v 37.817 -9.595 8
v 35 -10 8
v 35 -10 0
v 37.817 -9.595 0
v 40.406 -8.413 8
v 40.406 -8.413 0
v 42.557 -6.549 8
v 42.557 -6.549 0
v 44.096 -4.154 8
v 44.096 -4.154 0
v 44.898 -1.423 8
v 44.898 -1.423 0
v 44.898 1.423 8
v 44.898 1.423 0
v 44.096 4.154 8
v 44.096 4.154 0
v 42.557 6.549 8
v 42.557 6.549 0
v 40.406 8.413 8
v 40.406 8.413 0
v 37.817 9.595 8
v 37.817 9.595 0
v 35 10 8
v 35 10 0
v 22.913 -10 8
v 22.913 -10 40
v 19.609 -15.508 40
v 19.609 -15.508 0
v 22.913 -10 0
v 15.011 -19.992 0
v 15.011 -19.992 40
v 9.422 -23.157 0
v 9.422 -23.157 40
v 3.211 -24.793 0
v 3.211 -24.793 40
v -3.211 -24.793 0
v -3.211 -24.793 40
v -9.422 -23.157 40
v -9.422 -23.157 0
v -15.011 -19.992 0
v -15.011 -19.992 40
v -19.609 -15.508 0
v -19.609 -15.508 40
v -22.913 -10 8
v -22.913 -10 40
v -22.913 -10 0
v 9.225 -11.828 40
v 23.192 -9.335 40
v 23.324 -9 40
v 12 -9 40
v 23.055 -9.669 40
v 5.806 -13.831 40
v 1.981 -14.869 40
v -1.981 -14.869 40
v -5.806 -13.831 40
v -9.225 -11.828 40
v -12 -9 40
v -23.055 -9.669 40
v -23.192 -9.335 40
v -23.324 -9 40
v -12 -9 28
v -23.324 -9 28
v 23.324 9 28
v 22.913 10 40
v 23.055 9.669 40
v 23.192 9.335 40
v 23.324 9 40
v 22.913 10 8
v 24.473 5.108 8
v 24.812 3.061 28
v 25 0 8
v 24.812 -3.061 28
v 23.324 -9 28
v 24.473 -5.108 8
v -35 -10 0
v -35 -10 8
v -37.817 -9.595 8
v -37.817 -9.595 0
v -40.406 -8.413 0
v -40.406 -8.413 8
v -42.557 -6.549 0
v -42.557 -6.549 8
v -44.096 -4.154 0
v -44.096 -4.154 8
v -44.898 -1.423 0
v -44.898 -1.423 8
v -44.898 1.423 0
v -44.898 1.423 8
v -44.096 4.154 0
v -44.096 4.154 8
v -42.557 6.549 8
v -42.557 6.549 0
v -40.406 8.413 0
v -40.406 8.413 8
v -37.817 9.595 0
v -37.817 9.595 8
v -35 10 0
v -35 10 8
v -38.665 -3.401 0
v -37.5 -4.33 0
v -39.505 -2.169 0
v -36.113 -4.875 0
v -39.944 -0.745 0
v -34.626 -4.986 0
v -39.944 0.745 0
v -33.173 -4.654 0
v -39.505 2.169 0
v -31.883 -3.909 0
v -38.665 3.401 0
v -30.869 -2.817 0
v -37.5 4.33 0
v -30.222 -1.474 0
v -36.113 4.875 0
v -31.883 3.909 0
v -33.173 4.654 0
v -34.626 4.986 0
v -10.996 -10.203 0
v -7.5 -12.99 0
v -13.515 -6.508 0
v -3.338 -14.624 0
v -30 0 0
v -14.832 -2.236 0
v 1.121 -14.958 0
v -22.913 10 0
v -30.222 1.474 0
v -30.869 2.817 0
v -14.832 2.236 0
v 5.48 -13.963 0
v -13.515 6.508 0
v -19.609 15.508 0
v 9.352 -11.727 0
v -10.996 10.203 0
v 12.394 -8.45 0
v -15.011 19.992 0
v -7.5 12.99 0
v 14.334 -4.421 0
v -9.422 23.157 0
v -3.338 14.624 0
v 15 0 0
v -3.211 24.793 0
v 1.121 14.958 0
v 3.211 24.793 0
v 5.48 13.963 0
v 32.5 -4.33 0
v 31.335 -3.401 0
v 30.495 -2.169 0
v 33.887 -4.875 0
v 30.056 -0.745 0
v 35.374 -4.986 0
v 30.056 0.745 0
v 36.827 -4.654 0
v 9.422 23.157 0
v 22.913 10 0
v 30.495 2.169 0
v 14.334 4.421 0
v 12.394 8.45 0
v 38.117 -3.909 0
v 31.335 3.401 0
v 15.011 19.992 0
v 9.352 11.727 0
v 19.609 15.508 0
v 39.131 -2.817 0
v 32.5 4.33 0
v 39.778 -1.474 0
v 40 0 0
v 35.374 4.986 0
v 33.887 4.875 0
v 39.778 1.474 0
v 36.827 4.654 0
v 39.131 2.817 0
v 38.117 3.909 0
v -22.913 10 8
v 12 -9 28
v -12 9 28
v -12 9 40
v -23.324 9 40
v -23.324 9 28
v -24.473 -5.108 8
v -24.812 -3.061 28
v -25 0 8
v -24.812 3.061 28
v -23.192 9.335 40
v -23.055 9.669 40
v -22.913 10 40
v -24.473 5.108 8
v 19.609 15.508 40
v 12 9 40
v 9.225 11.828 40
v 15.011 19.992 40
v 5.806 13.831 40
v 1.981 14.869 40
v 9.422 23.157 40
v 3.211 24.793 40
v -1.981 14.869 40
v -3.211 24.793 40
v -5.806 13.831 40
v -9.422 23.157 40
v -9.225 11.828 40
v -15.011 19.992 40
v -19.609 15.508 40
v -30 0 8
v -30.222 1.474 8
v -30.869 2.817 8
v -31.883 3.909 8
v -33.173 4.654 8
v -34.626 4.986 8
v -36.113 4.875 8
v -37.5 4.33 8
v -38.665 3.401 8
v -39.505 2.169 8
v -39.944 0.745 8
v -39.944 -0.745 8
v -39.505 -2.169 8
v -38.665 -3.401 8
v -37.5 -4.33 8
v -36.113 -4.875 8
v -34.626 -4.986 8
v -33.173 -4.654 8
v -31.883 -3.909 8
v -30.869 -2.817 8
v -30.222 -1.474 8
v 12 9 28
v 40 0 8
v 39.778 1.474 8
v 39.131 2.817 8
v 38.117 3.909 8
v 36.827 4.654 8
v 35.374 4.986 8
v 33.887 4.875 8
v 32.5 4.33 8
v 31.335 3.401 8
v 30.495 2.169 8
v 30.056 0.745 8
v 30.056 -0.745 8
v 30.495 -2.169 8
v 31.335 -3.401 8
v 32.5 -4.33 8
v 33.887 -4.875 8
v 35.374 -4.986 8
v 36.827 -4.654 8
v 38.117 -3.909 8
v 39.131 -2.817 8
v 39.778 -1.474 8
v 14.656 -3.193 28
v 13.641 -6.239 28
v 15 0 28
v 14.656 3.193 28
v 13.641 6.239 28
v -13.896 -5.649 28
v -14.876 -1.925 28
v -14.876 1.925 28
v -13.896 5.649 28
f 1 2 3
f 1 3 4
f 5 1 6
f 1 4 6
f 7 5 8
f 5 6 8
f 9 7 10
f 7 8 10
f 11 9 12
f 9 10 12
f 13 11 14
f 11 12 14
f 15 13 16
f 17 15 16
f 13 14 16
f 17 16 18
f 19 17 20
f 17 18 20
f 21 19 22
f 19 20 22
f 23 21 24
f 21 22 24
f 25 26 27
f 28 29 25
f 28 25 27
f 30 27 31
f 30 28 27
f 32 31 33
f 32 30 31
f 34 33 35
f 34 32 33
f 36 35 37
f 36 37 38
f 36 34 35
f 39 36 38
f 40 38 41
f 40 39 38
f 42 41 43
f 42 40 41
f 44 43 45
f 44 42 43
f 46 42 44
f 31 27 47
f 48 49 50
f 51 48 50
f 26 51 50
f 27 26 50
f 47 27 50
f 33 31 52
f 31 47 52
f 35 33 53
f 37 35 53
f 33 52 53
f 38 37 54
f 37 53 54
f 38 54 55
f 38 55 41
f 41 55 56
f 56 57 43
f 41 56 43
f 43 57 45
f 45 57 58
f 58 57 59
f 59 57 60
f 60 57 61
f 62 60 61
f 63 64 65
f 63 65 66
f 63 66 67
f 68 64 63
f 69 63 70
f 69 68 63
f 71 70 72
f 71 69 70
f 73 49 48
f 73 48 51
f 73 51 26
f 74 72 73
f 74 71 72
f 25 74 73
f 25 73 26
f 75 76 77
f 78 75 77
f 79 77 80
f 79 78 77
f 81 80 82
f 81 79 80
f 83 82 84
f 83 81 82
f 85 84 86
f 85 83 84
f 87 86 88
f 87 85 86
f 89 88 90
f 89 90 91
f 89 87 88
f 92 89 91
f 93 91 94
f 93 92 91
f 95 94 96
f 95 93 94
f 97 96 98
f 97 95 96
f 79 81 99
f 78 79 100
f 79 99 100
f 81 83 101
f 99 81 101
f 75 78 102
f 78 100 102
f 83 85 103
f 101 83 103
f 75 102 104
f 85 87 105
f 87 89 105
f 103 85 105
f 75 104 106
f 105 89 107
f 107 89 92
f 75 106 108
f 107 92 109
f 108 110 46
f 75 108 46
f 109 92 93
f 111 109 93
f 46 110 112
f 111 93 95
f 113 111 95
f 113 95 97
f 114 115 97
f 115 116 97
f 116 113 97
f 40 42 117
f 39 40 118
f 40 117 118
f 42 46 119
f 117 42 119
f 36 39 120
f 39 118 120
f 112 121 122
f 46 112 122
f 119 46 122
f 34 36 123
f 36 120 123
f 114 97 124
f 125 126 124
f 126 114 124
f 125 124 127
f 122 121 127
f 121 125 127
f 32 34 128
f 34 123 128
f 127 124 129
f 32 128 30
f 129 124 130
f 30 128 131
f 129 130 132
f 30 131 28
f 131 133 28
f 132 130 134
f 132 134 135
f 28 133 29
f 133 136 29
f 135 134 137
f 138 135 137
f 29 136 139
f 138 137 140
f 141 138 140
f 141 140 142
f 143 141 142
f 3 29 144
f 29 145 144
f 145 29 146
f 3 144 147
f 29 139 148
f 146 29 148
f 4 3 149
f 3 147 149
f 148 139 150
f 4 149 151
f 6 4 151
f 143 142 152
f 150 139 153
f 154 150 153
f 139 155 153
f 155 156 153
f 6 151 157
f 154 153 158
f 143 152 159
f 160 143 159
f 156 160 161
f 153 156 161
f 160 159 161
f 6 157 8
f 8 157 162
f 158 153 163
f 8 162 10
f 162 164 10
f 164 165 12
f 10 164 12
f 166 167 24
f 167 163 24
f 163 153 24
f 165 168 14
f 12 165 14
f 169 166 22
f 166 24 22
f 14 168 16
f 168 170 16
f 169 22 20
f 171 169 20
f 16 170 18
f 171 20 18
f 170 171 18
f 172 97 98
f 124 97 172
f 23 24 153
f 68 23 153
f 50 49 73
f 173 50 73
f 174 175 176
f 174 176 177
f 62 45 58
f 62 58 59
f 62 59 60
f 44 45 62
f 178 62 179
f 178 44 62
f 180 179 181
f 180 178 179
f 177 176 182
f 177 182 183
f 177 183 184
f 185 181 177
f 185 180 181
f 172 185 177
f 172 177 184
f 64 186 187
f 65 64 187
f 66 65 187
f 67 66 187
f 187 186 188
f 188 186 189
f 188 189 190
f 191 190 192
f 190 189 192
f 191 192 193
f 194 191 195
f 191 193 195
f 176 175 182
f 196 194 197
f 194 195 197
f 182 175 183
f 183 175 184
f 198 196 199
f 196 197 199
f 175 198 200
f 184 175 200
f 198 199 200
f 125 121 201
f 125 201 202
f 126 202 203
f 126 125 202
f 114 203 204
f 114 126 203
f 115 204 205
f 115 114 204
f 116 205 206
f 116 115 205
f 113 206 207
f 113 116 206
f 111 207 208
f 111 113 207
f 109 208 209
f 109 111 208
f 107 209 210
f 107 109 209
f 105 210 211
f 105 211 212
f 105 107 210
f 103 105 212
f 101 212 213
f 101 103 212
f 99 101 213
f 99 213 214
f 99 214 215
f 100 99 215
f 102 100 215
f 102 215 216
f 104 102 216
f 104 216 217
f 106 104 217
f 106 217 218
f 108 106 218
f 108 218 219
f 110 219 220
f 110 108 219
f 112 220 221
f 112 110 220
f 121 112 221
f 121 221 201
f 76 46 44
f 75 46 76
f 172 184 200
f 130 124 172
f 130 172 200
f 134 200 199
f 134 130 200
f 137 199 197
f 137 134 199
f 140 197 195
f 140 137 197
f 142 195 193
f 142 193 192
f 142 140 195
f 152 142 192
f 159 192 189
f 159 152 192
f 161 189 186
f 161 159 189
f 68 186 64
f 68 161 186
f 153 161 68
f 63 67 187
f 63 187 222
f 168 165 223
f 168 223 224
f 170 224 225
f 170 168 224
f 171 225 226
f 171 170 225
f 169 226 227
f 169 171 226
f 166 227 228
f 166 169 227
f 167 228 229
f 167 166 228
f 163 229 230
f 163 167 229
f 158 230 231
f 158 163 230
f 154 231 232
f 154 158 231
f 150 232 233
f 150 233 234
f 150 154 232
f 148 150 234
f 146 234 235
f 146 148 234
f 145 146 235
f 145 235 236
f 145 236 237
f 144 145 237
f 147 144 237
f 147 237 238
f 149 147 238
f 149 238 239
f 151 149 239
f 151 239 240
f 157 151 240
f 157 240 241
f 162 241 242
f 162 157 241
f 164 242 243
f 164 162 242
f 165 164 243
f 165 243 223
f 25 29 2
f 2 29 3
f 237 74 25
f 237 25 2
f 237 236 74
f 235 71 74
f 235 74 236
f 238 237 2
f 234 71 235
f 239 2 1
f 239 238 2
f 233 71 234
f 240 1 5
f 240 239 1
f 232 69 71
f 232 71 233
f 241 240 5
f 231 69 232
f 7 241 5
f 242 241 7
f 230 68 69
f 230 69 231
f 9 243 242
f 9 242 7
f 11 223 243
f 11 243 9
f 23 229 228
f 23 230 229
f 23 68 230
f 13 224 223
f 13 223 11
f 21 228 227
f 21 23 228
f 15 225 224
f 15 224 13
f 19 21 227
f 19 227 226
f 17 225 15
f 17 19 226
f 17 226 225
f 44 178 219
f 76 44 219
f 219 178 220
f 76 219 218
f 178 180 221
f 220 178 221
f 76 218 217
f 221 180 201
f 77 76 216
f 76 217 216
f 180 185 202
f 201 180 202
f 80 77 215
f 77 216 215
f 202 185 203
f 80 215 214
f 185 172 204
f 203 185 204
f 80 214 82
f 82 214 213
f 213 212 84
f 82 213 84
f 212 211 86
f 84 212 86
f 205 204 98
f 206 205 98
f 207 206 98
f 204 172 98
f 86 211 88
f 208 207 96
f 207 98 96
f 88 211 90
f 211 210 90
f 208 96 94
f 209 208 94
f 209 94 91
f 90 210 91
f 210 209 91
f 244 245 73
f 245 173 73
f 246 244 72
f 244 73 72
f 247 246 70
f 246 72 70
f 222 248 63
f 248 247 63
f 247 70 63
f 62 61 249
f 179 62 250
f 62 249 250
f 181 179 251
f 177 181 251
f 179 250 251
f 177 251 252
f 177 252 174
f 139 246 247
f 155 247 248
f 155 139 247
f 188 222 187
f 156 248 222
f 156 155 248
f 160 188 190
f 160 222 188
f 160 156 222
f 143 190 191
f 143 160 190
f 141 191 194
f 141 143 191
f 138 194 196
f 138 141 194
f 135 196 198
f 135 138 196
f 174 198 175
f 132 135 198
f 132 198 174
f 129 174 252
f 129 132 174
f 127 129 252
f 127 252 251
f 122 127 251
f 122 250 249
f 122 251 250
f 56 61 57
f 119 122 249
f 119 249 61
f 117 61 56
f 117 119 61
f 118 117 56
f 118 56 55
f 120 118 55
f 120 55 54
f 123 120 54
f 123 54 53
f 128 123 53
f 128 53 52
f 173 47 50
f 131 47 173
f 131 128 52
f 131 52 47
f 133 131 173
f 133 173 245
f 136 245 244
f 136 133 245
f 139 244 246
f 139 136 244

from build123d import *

# Parameters (mm, degrees)
SKETCH1_R           = 15
BOSS_EXTRUDE5_DEPTH = 40
SKETCH1_12_R        = 5
BOSS_EXTRUDE6_DEPTH = 8
SKETCH2_W           = 12
SKETCH2_H           = 18
CUT_EXTRUDE1_DEPTH  = 68


with BuildPart() as part:
    # Sketch1 → Boss-Extrude5 (new body)
    with BuildSketch(Plane.XY):
        with BuildLine():
            ThreePointArc((22.912878475, 10), (0, 25), (-22.912878475, 10))
            ThreePointArc((-22.912878475, 10), (-25, 0), (-22.912878475, -10))
            ThreePointArc((-22.912878475, -10), (0, -25), (22.912878475, -10))
            ThreePointArc((22.912878475, -10), (25, 0), (22.912878475, 10))
        make_face()
        Circle(SKETCH1_R, mode=Mode.SUBTRACT)
    extrude(amount=BOSS_EXTRUDE5_DEPTH)

    # Sketch1<12> → Boss-Extrude6 (add)
    # profile 1 of 2: a face of its own
    with BuildSketch(Plane.XY):
        with BuildLine():
            Line((-22.912878475, 10), (-35, 10))
            ThreePointArc((-35, 10), (-45, 0), (-35, -10))
            Line((-35, -10), (-22.912878475, -10))
            ThreePointArc((-22.912878475, -10), (-25, 0), (-22.912878475, 10))
        make_face()
        with Locations((-35, 0)):
            Circle(SKETCH1_12_R, mode=Mode.SUBTRACT)
    # profile 2 of 2: a face of its own
    with BuildSketch(Plane.XY):
        with BuildLine():
            Line((35, 10), (22.912878475, 10))
            ThreePointArc((22.912878475, 10), (25, 0), (22.912878475, -10))
            Line((22.912878475, -10), (35, -10))
            ThreePointArc((35, -10), (45, 0), (35, 10))
        make_face()
        with Locations((35, 0)):
            Circle(SKETCH1_12_R, mode=Mode.SUBTRACT)
    extrude(amount=BOSS_EXTRUDE6_DEPTH)

    # Sketch2 → Cut-Extrude1 (cut)
    with BuildSketch(Plane(origin=(25, 0, 0), x_dir=(0, 0, -1), z_dir=(1, 0, 0))):
        with Locations((-34, 0)):
            Rectangle(SKETCH2_W, SKETCH2_H)
    extrude(amount=-CUT_EXTRUDE1_DEPTH, mode=Mode.SUBTRACT)


solid = part.part
